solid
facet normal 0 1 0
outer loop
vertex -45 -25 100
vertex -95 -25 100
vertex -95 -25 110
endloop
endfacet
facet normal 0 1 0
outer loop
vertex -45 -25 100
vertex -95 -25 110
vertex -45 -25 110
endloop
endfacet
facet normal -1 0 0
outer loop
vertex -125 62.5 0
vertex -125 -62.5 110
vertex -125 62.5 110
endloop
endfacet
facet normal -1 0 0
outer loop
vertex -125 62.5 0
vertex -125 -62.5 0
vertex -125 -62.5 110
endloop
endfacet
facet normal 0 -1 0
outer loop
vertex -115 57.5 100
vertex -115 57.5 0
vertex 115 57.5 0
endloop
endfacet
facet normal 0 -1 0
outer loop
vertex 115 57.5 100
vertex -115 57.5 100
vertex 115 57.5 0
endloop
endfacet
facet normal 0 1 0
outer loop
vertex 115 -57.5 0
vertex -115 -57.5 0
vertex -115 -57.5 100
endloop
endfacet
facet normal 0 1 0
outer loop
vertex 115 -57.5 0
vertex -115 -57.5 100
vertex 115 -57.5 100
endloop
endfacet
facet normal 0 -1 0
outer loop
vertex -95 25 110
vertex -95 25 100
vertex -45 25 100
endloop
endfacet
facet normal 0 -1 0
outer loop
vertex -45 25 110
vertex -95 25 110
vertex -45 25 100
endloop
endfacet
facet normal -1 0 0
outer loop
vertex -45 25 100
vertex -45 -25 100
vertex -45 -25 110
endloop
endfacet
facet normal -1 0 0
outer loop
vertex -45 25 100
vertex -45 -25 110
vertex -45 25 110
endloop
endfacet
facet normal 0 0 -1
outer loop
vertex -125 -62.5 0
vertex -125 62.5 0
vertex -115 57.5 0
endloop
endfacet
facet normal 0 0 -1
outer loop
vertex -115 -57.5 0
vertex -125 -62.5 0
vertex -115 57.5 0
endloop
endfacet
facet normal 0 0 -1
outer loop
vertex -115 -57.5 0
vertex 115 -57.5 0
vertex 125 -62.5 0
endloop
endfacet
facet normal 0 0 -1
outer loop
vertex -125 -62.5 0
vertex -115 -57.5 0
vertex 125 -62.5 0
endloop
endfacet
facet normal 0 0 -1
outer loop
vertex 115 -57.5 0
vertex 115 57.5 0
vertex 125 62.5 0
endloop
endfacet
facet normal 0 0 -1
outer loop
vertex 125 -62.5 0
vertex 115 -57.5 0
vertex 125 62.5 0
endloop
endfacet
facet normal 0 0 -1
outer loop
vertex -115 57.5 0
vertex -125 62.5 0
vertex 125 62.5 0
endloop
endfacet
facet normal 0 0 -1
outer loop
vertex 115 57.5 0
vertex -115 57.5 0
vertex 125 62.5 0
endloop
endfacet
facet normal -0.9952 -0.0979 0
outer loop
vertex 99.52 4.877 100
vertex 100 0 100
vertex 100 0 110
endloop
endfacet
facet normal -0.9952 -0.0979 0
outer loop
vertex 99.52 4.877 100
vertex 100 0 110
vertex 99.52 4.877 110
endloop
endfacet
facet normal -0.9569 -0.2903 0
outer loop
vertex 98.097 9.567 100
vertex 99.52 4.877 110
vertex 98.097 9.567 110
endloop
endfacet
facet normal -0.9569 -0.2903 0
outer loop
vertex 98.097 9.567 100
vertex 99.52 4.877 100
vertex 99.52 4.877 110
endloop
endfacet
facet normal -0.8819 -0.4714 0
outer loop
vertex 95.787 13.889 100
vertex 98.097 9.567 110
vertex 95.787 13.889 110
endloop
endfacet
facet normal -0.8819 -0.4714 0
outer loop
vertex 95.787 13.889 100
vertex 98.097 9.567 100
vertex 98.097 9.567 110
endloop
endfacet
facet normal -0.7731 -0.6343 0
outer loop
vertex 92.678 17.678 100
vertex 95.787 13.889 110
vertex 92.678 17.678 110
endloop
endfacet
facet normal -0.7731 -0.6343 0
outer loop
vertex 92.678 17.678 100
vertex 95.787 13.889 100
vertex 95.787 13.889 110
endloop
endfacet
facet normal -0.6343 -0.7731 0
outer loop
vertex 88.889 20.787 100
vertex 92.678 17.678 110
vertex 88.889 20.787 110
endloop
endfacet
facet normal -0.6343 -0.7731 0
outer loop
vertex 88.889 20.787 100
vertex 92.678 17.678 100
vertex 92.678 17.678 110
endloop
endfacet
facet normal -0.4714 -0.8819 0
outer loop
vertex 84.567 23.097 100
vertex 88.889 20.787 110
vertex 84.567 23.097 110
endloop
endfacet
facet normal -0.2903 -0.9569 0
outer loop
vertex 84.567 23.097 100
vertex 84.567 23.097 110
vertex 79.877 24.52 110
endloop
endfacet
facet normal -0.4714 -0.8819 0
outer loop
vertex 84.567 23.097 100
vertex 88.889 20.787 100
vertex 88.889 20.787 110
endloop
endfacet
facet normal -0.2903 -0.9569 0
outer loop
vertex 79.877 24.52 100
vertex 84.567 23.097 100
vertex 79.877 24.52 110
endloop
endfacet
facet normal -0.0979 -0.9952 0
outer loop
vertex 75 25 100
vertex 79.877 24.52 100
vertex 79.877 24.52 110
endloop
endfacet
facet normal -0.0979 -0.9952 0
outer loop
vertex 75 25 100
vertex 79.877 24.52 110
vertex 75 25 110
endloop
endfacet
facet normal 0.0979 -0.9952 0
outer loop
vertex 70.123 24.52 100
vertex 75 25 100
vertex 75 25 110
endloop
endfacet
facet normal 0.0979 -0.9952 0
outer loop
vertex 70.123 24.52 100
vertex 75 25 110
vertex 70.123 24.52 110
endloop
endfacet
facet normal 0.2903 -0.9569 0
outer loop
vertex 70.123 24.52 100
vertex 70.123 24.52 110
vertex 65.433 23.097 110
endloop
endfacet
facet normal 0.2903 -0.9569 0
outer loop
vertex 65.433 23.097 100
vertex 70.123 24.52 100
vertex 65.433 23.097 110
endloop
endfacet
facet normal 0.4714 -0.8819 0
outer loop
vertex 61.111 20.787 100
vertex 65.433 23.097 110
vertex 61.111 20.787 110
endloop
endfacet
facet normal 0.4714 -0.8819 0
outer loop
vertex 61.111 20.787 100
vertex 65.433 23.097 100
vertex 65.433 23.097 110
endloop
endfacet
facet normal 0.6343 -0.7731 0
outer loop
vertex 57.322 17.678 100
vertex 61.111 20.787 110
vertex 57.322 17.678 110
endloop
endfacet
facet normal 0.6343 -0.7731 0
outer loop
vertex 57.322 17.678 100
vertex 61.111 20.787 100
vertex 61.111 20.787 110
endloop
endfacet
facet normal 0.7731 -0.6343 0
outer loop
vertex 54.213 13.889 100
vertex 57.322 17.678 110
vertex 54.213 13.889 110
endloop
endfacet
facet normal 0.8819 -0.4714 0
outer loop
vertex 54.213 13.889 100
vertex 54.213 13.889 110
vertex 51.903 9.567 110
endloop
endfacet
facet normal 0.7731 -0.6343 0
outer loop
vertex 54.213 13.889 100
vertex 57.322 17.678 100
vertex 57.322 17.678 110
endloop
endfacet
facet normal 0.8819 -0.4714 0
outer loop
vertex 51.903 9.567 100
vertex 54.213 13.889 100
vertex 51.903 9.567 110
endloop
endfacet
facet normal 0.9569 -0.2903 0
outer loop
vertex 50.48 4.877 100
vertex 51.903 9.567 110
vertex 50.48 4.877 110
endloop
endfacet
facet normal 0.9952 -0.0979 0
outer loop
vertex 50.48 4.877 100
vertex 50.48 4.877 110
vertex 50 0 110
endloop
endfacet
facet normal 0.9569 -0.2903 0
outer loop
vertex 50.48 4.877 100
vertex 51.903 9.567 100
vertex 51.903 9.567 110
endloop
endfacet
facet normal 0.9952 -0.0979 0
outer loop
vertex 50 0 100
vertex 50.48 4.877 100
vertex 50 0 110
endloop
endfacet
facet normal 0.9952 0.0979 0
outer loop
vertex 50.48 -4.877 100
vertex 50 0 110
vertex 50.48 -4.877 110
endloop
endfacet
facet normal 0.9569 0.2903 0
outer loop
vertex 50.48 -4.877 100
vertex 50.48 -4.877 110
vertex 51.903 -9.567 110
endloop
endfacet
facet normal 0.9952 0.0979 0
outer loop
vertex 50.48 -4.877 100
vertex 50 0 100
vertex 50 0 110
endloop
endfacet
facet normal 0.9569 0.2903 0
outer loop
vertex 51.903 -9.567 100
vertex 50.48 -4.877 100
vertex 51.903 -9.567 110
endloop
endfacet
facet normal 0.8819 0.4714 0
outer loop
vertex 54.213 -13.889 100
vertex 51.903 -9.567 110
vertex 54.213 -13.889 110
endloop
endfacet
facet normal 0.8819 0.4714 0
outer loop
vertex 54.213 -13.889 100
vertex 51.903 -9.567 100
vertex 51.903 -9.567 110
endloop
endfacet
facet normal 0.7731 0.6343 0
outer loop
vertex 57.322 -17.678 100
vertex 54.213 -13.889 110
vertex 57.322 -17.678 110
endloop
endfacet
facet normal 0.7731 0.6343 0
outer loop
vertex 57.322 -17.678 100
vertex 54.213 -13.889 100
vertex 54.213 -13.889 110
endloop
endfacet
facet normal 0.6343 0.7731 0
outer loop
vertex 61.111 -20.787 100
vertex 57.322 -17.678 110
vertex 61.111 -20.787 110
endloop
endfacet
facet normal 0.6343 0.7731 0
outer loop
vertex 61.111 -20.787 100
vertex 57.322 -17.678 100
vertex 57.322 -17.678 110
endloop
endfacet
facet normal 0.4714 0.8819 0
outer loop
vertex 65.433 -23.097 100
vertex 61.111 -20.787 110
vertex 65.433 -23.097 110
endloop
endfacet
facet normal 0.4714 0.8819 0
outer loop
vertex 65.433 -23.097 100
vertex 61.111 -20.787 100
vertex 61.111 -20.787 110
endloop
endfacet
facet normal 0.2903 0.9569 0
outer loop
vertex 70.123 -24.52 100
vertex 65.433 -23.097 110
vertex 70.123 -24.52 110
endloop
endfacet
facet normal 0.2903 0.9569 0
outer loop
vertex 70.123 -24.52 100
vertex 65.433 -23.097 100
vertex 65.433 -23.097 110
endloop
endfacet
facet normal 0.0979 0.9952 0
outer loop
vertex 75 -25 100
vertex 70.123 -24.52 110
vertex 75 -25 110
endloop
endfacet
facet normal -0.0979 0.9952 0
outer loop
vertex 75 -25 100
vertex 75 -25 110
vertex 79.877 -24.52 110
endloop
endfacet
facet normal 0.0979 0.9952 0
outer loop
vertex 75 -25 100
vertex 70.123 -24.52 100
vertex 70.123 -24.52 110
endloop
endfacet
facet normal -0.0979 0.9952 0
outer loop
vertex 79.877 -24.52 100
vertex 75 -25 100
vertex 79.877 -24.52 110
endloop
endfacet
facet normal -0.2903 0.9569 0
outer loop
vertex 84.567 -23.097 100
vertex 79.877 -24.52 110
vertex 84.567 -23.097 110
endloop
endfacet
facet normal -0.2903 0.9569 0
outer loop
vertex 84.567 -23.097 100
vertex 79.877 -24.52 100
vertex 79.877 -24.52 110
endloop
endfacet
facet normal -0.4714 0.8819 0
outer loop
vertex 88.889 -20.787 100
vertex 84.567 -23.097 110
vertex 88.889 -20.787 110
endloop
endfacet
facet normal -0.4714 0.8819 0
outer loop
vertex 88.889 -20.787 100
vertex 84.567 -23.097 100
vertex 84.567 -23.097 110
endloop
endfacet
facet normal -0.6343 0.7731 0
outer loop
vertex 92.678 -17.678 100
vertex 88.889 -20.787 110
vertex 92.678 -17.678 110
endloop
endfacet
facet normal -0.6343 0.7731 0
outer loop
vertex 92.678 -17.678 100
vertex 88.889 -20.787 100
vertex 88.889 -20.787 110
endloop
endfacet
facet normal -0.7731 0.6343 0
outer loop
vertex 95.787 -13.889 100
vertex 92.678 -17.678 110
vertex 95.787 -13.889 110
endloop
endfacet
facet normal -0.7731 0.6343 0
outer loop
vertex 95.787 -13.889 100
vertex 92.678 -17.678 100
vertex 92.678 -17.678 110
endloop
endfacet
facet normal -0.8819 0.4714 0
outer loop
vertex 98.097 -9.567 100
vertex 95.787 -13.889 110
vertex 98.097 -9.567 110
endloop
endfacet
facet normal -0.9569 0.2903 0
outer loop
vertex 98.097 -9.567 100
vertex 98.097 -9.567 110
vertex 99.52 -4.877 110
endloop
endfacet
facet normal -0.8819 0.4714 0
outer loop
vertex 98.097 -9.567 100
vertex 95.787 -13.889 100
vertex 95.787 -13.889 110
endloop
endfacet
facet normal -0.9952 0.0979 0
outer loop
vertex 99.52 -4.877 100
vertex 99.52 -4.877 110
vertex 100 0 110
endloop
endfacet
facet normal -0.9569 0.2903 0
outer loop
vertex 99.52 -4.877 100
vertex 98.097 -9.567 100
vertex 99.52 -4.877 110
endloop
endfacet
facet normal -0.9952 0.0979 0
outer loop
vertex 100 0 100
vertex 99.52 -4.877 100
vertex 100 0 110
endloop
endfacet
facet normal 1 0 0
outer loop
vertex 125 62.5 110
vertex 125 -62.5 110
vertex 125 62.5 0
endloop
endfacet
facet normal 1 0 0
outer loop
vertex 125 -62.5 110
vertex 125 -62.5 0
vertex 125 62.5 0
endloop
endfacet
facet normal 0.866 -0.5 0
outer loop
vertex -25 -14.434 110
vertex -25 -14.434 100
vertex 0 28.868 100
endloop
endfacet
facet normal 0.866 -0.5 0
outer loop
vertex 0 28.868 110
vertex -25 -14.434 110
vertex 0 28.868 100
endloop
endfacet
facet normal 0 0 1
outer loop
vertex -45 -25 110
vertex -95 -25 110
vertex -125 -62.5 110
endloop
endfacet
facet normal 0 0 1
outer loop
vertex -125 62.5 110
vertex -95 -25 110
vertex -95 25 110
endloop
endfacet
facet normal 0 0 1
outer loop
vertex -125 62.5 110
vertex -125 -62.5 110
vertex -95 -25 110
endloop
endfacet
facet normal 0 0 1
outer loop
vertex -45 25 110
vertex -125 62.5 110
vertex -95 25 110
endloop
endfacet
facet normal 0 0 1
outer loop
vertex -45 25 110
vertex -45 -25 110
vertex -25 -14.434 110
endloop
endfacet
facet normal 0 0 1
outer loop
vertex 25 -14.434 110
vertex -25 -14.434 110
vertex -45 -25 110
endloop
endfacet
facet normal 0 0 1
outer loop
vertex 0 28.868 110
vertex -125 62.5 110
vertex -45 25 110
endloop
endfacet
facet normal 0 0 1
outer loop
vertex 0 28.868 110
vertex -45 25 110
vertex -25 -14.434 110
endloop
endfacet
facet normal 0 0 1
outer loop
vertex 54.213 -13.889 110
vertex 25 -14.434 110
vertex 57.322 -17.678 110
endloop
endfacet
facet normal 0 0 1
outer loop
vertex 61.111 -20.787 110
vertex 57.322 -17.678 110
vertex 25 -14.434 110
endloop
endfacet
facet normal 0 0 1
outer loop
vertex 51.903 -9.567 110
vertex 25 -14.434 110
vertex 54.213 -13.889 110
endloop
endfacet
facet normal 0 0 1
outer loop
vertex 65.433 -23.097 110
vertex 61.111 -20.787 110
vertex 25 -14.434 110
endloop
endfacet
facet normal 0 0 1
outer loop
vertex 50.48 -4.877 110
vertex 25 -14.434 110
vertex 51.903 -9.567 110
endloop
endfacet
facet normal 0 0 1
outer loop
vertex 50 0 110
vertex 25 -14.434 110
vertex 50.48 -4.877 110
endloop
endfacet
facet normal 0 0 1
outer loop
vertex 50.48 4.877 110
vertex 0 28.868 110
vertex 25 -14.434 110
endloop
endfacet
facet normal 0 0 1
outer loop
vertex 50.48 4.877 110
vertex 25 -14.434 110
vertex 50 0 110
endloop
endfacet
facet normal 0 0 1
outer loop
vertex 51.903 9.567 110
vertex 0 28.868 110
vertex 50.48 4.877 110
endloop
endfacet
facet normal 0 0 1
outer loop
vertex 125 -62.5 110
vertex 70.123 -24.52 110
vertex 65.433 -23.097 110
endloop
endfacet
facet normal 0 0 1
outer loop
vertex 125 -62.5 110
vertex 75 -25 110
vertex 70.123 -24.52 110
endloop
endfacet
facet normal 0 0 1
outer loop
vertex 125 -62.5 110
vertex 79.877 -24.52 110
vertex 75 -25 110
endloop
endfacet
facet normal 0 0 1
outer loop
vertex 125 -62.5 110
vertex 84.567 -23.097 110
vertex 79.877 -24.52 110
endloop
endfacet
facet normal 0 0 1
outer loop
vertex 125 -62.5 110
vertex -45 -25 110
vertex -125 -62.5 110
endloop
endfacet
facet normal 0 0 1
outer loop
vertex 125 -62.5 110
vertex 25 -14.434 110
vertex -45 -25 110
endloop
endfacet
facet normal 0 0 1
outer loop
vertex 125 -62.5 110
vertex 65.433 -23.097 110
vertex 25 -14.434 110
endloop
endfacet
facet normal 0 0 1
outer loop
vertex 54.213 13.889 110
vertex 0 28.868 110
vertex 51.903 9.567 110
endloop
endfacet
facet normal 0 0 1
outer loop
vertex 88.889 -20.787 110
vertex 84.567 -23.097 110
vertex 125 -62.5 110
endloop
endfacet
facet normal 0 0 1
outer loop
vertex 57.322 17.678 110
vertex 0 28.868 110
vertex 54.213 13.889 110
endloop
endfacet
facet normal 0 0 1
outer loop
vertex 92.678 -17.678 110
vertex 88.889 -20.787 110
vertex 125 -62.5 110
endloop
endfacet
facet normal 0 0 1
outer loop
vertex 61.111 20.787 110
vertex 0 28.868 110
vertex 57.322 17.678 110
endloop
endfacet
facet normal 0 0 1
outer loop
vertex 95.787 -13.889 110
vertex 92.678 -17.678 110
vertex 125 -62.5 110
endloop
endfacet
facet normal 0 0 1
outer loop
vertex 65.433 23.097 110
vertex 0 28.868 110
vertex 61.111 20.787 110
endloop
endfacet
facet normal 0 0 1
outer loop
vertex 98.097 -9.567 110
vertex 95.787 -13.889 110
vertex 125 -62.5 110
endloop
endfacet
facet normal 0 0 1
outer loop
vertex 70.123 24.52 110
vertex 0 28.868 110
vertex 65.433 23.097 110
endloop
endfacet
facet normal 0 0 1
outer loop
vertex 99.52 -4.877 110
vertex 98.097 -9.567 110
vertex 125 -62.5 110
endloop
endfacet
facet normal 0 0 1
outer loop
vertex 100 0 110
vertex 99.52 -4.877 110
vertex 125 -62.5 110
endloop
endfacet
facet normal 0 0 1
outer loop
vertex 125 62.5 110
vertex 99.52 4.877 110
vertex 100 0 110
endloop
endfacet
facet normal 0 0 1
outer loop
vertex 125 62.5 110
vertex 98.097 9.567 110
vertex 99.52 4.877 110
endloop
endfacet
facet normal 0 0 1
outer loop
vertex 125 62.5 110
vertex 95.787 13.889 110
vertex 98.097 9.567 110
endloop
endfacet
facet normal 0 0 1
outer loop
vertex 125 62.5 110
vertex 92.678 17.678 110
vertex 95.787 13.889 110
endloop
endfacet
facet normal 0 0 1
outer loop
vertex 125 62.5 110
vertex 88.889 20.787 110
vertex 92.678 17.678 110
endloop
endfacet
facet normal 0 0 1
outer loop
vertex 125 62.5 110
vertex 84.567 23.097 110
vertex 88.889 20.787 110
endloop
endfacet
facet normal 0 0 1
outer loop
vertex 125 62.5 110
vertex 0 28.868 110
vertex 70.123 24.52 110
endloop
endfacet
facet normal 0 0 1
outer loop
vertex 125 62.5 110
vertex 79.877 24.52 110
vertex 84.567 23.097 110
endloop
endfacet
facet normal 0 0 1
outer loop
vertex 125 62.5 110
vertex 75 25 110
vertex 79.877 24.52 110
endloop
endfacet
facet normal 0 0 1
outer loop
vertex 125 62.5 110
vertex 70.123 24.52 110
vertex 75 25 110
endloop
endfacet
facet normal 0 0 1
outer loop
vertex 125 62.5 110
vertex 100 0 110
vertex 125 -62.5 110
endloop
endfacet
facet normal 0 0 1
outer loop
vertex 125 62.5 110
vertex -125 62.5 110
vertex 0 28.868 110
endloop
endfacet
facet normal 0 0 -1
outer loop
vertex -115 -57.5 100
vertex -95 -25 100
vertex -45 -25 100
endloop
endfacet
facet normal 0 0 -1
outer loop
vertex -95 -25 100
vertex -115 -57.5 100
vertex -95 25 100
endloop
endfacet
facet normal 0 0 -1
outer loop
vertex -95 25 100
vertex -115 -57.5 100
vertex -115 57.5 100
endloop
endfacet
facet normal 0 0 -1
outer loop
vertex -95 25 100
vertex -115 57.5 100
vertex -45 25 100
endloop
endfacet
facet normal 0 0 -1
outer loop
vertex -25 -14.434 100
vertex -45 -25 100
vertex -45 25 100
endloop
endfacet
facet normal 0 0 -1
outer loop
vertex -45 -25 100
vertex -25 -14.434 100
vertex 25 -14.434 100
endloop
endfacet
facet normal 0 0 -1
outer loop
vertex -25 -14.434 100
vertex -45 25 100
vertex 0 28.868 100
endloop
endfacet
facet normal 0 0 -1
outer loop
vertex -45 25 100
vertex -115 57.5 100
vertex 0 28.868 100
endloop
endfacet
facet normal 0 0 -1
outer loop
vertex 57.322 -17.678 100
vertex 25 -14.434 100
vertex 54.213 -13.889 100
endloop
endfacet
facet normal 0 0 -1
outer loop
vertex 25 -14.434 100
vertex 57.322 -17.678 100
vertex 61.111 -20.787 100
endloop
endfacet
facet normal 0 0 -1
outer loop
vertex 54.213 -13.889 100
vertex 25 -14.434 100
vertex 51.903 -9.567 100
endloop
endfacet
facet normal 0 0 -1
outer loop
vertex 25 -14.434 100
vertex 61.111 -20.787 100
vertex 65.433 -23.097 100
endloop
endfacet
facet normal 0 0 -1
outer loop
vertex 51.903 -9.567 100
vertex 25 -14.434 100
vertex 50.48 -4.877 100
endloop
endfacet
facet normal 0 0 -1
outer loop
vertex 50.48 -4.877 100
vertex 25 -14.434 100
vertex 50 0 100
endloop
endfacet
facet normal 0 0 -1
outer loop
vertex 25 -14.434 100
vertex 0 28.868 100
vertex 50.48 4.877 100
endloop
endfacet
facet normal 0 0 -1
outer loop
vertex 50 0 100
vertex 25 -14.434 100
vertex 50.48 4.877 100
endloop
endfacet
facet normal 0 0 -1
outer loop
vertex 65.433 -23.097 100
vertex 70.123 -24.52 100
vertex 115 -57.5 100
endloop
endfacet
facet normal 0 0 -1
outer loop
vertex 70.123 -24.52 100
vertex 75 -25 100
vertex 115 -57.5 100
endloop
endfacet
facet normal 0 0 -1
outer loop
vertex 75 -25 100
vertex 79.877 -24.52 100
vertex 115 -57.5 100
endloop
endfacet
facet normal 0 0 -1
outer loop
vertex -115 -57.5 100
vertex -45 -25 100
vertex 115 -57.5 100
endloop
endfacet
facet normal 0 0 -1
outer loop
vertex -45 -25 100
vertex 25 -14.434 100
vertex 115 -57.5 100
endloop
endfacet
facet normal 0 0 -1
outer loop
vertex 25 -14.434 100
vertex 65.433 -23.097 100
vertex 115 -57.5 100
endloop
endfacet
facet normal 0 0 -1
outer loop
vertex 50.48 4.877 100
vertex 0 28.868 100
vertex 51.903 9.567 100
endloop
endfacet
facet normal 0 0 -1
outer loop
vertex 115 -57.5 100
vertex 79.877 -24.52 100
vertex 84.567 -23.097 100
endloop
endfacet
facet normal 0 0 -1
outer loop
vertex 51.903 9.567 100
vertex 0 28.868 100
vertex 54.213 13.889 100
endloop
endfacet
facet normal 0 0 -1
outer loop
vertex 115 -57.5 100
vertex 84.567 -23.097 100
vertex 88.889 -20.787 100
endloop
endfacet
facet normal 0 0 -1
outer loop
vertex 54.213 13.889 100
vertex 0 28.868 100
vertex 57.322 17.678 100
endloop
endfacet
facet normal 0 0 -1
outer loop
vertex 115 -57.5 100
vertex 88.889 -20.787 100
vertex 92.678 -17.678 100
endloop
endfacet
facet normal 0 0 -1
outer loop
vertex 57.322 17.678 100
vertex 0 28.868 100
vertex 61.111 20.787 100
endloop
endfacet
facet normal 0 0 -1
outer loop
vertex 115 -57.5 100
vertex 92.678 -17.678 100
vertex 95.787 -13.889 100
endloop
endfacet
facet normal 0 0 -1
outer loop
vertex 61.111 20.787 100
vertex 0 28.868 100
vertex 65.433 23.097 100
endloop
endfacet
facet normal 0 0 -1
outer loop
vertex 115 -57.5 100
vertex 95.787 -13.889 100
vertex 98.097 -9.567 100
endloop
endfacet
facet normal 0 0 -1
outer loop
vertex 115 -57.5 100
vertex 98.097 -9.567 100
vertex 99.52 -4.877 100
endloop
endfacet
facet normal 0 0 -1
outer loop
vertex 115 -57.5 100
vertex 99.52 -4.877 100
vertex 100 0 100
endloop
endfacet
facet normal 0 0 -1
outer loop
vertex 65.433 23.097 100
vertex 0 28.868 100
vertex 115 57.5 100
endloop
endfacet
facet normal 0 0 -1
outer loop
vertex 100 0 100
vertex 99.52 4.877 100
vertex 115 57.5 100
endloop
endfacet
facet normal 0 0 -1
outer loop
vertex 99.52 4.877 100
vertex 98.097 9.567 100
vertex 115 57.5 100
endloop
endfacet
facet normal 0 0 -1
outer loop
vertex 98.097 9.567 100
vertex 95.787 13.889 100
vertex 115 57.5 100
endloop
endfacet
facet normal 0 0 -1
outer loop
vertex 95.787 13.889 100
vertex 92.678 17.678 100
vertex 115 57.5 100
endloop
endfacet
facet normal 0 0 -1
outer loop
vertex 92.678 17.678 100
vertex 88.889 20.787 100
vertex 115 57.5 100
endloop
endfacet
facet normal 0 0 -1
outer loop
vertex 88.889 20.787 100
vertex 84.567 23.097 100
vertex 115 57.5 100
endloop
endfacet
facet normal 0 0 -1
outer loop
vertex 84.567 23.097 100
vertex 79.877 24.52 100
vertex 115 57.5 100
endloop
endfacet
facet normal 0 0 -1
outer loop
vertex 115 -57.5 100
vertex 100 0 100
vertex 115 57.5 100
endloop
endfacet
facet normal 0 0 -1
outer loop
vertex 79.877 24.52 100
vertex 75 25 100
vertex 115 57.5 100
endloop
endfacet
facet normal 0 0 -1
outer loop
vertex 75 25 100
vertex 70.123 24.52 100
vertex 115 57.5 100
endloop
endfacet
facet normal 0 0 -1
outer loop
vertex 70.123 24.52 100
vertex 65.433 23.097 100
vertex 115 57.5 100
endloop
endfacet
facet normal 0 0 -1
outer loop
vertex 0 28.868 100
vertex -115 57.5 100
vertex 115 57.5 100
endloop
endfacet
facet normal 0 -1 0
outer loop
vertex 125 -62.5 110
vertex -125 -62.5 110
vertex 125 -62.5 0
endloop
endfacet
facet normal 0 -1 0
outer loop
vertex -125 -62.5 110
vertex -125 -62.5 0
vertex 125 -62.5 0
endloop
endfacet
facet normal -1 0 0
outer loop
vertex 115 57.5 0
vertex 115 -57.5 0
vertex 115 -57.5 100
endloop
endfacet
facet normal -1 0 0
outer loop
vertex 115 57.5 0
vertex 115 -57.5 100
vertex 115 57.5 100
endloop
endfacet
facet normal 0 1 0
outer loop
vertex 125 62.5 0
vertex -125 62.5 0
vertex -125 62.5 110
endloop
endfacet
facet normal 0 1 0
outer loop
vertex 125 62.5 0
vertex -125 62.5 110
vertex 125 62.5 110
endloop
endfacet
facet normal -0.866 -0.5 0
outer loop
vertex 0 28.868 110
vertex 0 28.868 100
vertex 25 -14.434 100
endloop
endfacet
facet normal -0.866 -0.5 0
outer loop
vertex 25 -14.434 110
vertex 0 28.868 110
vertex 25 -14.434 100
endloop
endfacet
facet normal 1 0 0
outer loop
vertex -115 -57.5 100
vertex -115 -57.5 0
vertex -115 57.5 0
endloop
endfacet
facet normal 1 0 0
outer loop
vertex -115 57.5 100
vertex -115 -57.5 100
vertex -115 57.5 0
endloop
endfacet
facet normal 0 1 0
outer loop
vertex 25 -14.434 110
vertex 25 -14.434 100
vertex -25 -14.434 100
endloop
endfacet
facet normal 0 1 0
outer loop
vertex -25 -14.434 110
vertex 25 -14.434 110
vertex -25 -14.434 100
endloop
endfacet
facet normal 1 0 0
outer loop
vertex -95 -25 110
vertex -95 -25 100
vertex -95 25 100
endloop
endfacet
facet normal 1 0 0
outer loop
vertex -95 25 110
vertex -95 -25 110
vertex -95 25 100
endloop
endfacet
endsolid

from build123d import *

# Parameters (mm, degrees)
SKETCH1_W           = 250
SKETCH1_H           = 125
SKETCH1_W_2         = 230
SKETCH1_H_2         = 115
BOSS_EXTRUDE1_DEPTH = 100
SKETCH3_W           = 250
SKETCH3_H           = 125
SKETCH3_W_2         = 230
SKETCH3_H_2         = 115
SKETCH3_R           = 25
SKETCH3_W_3         = 50
SKETCH3_H_3         = 50
BOSS_EXTRUDE4_DEPTH = 10


with BuildPart() as part:
    # Sketch1 → Boss-Extrude1 (new body)
    with BuildSketch(Plane.XY):
        Rectangle(SKETCH1_W, SKETCH1_H)
        Rectangle(SKETCH1_W_2, SKETCH1_H_2, mode=Mode.SUBTRACT)
    extrude(amount=BOSS_EXTRUDE1_DEPTH)

    # Sketch3 → Boss-Extrude4 (add)
    # profile 1 of 2: a face of its own
    with BuildSketch(Plane.XY.offset(100)):
        Rectangle(SKETCH3_W, SKETCH3_H)
        Rectangle(SKETCH3_W_2, SKETCH3_H_2, mode=Mode.SUBTRACT)
    # profile 2 of 2: a face of its own
    with BuildSketch(Plane.XY.offset(100)):
        Rectangle(SKETCH3_W_2, SKETCH3_H_2)
        with Locations((75, 0)):
            Circle(SKETCH3_R, mode=Mode.SUBTRACT)
        with Locations((-70, 0)):
            Rectangle(SKETCH3_W_3, SKETCH3_H_3, mode=Mode.SUBTRACT)
        Polygon((0, 28.867513459), (25, -14.43375673), (-25, -14.43375673), align=None, mode=Mode.SUBTRACT)
    extrude(amount=BOSS_EXTRUDE4_DEPTH)


solid = part.part
